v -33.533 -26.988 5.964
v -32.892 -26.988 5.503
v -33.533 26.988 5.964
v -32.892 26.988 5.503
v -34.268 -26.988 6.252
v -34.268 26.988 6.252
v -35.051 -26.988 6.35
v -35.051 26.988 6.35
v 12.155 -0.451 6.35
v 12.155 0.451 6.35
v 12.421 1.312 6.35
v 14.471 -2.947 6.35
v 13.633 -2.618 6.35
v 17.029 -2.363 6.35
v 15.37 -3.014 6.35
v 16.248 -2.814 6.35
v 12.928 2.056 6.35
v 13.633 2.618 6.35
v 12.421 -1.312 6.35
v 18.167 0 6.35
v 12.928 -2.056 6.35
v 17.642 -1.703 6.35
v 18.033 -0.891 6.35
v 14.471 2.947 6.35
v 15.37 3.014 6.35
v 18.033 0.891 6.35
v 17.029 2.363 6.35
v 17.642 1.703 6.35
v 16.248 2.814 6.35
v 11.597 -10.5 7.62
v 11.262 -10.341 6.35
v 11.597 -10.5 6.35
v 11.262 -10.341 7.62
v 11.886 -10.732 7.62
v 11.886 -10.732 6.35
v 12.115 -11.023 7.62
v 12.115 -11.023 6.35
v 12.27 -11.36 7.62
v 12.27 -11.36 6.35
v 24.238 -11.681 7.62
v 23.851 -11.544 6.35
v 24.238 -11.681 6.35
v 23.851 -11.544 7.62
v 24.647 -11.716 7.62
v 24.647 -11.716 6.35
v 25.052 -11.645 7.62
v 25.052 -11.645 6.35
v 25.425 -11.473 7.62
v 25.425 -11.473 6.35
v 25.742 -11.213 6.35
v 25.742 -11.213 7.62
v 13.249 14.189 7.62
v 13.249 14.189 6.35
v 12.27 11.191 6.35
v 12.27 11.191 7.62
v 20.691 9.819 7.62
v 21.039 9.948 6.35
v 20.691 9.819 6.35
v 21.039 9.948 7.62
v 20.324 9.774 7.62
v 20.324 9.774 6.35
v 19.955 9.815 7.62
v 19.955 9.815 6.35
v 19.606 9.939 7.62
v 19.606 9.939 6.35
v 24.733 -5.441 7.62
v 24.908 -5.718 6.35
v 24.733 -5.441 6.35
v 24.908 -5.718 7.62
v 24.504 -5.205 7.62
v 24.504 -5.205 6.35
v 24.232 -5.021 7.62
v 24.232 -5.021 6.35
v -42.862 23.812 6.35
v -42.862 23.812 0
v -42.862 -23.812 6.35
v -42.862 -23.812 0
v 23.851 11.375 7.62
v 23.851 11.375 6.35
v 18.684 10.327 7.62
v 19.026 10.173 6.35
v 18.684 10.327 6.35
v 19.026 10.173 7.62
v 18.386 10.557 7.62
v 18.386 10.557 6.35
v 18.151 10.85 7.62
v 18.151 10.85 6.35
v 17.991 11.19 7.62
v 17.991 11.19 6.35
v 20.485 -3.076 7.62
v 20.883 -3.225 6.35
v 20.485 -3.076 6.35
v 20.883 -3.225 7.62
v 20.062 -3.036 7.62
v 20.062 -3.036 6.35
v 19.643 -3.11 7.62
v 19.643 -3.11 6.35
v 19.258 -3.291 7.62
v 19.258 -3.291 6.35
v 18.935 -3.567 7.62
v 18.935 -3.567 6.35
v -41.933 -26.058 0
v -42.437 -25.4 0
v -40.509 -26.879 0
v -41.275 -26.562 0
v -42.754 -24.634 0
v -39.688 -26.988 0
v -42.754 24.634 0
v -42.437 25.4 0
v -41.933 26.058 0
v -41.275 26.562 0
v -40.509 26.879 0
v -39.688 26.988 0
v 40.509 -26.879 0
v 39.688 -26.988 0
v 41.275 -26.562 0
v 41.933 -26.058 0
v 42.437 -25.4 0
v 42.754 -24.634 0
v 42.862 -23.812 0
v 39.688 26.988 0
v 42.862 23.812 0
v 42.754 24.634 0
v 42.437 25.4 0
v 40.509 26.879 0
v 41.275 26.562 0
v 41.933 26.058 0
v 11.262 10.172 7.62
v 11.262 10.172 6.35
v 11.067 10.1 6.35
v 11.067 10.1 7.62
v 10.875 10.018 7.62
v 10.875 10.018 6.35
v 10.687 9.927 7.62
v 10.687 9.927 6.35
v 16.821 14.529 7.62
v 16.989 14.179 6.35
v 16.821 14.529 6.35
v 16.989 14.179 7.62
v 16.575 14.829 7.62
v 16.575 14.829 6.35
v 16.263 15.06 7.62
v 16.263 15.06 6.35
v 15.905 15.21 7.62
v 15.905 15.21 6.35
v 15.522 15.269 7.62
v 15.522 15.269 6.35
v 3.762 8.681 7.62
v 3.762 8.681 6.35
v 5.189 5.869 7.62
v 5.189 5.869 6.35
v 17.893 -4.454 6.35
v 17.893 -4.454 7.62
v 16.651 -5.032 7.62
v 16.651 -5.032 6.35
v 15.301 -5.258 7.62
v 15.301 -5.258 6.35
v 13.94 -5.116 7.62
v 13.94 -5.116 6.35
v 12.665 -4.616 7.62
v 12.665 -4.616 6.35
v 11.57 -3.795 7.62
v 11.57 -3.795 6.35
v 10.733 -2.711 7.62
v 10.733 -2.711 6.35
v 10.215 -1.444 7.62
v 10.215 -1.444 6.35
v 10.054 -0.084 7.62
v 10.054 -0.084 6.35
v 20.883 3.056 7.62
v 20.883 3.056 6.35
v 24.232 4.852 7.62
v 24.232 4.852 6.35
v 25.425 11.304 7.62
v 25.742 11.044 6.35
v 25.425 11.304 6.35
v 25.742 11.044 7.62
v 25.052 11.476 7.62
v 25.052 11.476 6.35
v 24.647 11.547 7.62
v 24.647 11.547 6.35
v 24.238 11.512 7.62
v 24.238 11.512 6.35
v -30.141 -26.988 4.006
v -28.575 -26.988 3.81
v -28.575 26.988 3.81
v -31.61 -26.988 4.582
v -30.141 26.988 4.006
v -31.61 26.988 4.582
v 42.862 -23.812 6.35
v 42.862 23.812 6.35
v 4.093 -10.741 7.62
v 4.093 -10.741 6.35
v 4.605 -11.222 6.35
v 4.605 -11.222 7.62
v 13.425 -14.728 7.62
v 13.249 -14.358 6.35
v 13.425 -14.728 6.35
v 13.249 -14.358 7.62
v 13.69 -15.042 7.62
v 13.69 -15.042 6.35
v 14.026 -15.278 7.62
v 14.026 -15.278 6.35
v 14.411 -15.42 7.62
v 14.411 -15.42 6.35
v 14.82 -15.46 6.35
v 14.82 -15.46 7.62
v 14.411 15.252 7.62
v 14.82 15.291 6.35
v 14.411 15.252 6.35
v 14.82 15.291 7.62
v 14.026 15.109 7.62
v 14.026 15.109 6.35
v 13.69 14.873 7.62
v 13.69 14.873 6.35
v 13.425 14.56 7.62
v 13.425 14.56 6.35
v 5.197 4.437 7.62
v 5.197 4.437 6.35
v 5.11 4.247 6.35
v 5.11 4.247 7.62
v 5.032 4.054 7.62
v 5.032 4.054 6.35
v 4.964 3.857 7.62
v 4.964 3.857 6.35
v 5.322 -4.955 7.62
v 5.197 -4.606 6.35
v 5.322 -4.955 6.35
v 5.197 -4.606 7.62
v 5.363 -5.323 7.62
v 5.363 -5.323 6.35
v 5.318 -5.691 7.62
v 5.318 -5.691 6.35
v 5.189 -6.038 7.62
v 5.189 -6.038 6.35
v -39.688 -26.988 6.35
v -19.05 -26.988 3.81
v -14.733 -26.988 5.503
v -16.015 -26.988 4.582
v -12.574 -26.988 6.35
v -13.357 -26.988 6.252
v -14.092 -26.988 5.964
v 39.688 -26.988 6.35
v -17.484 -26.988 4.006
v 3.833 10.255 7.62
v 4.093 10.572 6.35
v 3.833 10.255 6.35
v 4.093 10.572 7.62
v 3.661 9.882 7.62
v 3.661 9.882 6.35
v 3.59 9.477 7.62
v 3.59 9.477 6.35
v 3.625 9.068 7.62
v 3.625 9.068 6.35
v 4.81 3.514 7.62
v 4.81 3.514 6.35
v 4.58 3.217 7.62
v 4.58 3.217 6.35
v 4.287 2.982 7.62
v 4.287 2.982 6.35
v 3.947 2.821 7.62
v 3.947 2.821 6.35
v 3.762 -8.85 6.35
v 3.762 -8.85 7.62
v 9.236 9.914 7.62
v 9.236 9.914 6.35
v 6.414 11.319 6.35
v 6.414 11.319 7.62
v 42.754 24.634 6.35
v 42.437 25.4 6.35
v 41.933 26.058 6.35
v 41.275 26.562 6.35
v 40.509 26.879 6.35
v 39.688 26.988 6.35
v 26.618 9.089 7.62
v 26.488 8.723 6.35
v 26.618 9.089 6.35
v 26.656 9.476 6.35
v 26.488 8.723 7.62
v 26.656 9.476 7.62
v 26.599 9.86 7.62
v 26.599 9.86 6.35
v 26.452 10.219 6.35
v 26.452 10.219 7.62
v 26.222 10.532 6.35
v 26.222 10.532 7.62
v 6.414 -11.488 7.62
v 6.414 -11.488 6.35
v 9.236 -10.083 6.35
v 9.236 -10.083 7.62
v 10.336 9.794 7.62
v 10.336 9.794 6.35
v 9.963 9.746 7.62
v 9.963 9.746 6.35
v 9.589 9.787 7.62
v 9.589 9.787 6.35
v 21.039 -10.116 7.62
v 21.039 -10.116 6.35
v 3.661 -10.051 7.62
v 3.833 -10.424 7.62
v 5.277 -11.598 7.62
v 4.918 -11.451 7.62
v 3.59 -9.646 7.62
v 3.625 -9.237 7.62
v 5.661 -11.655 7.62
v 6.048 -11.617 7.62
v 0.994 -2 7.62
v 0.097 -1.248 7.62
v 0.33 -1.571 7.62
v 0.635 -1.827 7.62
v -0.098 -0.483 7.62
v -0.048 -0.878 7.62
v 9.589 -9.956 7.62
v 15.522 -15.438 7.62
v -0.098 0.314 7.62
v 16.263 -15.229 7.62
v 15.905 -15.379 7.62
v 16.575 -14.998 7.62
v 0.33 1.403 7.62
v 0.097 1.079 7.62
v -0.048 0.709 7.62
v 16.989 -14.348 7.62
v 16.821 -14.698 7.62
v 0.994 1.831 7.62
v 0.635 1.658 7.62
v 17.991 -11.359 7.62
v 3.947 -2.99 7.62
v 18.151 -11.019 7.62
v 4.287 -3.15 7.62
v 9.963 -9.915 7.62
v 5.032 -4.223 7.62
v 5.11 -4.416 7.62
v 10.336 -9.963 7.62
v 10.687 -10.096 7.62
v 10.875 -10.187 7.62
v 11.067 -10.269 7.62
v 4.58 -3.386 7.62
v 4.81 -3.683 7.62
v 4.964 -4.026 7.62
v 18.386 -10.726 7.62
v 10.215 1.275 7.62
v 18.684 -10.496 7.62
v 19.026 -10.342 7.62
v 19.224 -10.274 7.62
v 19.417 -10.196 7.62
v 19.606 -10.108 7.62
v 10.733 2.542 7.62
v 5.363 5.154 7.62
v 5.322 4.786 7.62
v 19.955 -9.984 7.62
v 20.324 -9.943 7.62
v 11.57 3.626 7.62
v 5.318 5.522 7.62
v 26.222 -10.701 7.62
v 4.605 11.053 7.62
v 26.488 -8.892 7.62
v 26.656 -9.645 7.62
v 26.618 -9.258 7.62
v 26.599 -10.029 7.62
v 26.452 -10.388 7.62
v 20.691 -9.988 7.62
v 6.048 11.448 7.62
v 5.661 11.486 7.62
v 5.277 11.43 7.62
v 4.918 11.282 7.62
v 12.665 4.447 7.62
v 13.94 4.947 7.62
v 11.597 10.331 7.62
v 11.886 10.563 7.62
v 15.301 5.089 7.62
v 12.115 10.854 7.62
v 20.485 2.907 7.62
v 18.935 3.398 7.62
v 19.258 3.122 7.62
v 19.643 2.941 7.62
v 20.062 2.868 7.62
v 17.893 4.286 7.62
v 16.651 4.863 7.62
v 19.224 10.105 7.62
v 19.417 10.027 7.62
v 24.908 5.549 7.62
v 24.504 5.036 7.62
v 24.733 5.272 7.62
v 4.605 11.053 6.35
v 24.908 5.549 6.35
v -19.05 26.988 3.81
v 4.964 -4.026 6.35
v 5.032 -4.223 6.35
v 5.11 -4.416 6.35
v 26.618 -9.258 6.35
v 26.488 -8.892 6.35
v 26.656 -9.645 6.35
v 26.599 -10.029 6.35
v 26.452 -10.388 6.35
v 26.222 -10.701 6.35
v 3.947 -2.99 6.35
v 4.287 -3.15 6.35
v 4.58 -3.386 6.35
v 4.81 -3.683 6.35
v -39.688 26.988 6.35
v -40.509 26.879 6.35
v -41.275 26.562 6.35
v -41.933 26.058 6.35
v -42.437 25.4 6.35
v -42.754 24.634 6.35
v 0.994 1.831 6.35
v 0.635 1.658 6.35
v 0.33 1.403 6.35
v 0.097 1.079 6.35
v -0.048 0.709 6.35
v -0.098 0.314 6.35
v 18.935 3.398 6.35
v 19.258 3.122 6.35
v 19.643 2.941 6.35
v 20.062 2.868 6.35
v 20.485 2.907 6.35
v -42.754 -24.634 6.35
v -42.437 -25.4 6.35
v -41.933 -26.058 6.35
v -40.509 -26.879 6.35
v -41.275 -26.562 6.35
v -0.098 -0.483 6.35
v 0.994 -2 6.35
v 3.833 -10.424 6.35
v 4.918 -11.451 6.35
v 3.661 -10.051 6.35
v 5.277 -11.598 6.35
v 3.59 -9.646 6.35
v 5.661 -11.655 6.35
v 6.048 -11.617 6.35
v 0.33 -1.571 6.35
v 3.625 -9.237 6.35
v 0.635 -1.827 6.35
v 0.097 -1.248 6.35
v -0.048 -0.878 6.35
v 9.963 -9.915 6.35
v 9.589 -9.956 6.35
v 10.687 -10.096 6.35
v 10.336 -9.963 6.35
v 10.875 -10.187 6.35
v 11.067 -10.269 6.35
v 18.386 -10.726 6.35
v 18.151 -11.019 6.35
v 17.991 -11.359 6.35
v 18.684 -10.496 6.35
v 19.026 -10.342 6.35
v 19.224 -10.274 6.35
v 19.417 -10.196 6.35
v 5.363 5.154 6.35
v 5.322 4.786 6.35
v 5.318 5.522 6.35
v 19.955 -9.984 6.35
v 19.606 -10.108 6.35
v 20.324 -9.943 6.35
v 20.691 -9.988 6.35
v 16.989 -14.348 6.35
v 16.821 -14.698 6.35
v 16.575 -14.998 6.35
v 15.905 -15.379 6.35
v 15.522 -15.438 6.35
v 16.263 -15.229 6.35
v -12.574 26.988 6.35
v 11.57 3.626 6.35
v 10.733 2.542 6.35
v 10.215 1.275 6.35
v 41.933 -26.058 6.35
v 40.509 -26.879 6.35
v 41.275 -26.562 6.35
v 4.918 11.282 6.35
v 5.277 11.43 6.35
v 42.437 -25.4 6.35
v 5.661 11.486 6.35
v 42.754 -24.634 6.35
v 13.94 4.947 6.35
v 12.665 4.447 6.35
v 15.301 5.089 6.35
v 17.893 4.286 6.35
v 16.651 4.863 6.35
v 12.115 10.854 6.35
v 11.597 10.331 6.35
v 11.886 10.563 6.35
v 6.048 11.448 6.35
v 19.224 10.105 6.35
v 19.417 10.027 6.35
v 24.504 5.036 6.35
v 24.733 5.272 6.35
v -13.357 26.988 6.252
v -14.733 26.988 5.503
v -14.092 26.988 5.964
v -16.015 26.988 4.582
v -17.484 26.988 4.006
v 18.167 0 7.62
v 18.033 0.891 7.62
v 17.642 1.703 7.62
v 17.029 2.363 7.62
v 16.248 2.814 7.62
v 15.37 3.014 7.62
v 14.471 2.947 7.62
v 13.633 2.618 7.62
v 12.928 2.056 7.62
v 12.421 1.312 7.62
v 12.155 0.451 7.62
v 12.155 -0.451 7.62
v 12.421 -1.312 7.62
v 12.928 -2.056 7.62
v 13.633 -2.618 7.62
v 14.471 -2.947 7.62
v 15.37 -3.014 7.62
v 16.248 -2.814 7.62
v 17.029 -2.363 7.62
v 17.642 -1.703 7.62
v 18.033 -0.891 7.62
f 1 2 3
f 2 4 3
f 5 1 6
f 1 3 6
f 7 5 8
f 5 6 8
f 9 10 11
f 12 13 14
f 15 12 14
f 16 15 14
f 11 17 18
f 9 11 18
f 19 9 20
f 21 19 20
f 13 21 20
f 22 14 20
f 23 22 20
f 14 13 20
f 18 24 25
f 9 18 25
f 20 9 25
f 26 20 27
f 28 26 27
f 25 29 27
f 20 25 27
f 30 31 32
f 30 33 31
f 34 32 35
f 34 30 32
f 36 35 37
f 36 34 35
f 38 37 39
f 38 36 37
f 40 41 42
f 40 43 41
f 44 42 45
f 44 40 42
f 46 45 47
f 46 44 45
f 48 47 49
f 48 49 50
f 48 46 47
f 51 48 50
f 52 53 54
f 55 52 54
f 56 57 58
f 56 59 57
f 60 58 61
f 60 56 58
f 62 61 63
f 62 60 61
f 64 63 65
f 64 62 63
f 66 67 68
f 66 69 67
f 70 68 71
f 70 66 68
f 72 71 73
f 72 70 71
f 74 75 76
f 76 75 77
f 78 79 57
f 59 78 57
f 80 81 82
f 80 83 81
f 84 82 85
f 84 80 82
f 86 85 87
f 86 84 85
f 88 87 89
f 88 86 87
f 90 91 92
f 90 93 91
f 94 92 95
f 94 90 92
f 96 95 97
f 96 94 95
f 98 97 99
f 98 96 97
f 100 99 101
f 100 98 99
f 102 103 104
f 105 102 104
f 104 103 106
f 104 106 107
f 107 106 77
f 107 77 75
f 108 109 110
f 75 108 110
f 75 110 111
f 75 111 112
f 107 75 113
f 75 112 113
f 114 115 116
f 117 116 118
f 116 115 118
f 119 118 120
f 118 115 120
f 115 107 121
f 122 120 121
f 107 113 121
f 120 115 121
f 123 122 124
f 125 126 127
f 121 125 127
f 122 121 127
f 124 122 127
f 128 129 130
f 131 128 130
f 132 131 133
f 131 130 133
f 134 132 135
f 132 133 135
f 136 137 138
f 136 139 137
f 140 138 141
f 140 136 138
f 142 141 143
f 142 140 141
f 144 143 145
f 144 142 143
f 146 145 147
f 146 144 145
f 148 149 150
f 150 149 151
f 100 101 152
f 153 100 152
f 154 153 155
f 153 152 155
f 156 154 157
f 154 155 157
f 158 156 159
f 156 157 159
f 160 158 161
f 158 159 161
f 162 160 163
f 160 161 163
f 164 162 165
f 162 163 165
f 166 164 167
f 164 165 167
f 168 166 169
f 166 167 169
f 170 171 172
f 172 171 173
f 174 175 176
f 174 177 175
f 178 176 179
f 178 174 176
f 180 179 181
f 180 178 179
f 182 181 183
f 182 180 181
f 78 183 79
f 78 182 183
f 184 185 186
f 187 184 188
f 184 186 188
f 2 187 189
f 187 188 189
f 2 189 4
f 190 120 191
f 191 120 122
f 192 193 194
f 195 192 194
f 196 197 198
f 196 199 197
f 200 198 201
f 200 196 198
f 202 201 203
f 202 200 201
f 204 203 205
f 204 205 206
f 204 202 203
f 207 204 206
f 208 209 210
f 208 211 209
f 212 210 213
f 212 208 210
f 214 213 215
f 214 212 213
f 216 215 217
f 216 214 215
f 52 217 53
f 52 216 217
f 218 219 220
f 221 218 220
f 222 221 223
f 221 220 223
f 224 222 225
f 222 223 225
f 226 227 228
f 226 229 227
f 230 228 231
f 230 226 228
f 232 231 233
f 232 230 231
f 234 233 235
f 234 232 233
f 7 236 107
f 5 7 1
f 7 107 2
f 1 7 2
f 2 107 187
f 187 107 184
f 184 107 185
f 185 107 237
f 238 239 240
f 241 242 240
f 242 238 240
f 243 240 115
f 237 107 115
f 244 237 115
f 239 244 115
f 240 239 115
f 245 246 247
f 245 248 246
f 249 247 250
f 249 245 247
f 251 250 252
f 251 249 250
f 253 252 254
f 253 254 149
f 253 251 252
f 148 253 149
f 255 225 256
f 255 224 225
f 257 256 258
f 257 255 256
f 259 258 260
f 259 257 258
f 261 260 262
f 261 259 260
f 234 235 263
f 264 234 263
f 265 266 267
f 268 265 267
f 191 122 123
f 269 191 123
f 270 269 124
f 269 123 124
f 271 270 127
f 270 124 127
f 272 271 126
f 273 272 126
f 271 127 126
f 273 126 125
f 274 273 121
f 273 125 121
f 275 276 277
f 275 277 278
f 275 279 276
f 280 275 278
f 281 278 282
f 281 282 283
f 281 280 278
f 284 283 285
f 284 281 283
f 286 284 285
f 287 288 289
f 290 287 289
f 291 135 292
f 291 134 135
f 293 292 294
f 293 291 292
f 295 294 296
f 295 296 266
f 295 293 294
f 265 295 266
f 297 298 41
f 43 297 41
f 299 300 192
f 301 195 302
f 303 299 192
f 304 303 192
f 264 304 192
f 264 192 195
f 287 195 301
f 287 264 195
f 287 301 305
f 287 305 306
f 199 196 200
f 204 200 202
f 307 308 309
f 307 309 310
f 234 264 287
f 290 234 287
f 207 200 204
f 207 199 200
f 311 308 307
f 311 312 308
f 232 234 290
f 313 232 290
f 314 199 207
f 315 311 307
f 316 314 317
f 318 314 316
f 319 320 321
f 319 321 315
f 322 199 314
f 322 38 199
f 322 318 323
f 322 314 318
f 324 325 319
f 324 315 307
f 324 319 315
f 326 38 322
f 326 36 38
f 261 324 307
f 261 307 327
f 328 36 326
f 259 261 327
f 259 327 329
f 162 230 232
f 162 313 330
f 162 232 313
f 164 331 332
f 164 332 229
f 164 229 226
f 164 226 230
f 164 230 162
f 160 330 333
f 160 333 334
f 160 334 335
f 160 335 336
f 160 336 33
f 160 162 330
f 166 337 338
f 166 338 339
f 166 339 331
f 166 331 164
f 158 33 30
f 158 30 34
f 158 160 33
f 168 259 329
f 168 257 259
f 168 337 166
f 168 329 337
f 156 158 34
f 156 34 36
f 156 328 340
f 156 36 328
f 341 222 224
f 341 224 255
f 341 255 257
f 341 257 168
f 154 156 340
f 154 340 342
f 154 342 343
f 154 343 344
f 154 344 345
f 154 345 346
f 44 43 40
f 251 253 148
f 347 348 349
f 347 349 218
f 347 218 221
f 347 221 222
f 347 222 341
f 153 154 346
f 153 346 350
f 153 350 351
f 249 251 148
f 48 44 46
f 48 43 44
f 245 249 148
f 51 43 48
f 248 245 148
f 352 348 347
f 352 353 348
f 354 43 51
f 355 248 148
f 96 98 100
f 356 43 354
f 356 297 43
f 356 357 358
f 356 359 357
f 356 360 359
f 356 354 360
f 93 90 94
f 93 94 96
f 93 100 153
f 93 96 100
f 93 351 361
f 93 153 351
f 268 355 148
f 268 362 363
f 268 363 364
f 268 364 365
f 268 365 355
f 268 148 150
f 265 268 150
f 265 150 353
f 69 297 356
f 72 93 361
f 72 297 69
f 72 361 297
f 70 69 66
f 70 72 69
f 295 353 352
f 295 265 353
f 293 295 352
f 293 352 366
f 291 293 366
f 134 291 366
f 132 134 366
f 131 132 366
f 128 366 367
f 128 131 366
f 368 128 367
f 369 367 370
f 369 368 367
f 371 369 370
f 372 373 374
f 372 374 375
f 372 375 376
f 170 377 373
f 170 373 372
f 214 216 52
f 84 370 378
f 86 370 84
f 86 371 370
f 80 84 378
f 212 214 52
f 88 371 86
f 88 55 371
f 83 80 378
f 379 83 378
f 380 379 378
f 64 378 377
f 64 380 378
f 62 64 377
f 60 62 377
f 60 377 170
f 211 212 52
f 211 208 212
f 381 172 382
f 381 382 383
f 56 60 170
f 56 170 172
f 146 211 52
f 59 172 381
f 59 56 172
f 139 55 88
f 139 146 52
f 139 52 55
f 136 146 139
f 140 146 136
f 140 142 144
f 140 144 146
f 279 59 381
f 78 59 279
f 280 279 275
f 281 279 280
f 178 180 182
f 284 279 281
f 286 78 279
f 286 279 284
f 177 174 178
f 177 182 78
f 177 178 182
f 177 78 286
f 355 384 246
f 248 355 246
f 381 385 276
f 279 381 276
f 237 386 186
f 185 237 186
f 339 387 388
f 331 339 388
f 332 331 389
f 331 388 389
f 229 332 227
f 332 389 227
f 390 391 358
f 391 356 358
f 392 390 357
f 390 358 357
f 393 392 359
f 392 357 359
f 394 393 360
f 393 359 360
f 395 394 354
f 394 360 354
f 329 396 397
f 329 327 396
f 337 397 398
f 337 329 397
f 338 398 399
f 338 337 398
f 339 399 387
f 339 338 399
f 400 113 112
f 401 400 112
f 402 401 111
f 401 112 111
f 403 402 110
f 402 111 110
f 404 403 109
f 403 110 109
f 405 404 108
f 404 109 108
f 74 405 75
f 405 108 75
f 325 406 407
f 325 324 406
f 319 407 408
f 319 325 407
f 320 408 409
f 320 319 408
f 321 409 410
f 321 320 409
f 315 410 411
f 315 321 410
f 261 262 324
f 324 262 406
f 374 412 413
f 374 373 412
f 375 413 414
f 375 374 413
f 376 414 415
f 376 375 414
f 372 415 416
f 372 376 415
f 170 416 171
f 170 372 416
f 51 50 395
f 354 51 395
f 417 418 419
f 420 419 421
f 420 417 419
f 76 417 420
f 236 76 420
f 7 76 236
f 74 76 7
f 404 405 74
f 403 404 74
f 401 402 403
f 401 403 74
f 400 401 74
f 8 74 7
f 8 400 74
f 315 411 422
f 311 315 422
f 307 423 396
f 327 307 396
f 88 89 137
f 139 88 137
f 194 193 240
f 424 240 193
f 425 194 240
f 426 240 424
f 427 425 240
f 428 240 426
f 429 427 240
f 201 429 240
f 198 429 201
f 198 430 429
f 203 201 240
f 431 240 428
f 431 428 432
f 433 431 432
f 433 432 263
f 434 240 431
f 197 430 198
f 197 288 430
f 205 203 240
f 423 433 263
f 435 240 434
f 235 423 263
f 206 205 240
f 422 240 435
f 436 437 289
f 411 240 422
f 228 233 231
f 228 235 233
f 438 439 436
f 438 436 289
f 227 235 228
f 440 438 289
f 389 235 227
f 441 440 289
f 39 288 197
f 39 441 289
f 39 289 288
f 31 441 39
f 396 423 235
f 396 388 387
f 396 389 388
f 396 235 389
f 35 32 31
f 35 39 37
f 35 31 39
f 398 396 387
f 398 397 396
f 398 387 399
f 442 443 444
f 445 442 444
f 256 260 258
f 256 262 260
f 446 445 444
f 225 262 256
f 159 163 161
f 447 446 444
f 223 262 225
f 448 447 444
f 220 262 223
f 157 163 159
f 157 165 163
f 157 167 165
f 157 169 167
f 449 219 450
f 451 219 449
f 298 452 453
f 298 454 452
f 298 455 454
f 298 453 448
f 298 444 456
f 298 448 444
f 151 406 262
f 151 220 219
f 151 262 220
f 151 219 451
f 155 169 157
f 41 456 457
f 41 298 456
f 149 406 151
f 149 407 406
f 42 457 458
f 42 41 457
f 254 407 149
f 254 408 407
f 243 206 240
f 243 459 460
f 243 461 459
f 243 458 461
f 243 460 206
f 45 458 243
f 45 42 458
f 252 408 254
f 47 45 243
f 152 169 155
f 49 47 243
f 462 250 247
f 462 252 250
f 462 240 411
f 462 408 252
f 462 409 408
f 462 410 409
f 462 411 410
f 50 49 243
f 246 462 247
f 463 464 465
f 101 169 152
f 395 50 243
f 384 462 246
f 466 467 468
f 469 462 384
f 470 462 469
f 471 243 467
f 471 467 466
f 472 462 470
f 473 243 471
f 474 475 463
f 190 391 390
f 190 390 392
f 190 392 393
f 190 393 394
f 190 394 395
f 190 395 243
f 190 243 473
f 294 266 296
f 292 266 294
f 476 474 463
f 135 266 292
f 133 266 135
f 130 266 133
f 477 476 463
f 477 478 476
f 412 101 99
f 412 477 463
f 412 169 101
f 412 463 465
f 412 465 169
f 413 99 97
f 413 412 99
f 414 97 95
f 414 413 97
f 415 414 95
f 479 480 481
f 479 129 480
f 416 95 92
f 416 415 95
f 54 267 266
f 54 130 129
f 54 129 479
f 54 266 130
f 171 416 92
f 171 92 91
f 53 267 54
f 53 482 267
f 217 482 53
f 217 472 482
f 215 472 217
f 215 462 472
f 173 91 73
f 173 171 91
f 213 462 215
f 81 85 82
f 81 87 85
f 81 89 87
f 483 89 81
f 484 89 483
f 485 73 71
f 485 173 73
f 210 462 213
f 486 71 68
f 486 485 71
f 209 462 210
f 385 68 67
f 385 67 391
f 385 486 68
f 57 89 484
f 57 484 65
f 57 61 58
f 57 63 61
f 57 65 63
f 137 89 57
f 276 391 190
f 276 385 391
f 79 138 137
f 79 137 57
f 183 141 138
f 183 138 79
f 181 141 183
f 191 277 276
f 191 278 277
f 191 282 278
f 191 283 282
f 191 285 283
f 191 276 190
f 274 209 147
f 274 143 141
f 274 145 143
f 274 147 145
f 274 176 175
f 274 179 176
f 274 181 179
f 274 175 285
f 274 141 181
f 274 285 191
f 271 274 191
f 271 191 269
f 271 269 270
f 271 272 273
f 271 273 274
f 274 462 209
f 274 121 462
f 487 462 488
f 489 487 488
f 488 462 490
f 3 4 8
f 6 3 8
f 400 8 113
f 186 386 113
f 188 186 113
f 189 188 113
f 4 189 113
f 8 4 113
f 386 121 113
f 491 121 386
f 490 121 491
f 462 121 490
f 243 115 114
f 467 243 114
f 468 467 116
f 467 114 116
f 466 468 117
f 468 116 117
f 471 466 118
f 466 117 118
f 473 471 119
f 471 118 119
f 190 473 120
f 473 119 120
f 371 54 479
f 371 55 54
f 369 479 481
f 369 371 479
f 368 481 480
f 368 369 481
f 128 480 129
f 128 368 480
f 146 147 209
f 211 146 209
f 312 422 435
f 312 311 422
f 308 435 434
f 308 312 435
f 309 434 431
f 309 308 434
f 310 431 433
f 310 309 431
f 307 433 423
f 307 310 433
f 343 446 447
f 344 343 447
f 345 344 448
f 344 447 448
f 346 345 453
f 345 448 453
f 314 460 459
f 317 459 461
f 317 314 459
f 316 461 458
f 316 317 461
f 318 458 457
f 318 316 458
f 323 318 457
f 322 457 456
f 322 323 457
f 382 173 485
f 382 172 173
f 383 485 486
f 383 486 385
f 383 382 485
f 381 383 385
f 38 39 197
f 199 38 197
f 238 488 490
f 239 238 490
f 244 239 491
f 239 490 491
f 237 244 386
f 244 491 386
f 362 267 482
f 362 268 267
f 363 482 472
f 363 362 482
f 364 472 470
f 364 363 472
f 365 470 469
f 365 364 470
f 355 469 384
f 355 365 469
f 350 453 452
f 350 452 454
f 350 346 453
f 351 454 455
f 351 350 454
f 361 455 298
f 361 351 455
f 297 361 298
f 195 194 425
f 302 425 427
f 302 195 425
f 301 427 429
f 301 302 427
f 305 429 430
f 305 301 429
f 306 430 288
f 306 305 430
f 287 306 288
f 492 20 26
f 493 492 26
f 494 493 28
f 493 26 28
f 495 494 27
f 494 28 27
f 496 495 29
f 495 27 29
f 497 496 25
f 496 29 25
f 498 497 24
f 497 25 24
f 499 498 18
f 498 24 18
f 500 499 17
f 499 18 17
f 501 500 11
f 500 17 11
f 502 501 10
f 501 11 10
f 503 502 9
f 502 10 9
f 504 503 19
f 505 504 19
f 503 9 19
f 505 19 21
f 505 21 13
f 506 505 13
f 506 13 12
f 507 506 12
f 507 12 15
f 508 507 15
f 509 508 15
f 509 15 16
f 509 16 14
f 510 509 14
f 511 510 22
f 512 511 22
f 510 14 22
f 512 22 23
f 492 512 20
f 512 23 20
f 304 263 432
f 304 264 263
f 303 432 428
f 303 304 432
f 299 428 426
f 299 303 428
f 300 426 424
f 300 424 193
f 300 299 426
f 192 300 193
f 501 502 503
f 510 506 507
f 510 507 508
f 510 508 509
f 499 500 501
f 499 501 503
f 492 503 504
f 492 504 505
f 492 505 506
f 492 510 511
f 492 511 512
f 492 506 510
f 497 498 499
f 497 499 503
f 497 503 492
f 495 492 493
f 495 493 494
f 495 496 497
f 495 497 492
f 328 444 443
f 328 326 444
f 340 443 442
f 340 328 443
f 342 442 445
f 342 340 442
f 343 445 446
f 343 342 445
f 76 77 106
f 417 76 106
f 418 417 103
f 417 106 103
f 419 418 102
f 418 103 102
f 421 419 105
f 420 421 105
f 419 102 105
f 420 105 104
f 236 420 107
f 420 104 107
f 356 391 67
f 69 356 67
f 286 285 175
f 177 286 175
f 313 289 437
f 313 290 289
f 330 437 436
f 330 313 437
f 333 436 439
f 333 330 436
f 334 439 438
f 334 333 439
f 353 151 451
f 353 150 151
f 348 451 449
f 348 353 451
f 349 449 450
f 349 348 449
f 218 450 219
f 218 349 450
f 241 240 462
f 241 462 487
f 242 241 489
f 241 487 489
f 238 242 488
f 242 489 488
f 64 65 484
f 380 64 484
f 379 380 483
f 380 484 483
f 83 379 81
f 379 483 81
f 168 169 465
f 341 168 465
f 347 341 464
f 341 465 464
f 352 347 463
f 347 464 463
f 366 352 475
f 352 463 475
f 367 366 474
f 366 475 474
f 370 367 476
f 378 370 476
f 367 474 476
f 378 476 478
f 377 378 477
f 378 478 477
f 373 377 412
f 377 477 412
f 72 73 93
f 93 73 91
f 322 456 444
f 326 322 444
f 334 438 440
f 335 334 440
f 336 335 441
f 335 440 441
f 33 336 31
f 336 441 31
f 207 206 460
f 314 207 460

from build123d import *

# Parameters (mm, degrees)
F1_DEPTH = 6.35
F3_DEPTH = 76.2
F4_R     = 3.175
F6_DEPTH = 1.27
F5_R     = 3.022839237
F7_R     = 1.6002


with BuildPart() as f1:
    # F0 (on Top) → F1 (new body)
    with BuildSketch(Plane.XY):
        with BuildLine():
            Line((-39.6875, -26.9875), (39.6875, -26.9875))
            ThreePointArc((39.6875, -26.9875), (41.9325640303, -26.0575640303), (42.8625, -23.8125))
            Line((42.8625, -23.8125), (42.8625, 23.8125))
            ThreePointArc((42.8625, 23.8125), (41.9325640303, 26.0575640303), (39.6875, 26.9875))
            Line((39.6875, 26.9875), (-39.6875, 26.9875))
            ThreePointArc((-39.6875, 26.9875), (-41.9325640303, 26.0575640303), (-42.8625, 23.8125))
            Line((-42.8625, 23.8125), (-42.8625, -23.8125))
            ThreePointArc((-42.8625, -23.8125), (-41.9325640303, -26.0575640303), (-39.6875, -26.9875))
        make_face()
    extrude(amount=F1_DEPTH)

    # F2 (on face) → F3 (cut)
    with BuildSketch(Plane(origin=(0, 26.9875, 0), x_dir=(-1, 0, 0), z_dir=(0, 1, 0))):
        with BuildLine():
            ThreePointArc((19.05, 16.51), (12.7, 10.16), (19.05, 3.81))
            Line((19.05, 3.81), (28.575, 3.81))
            ThreePointArc((28.575, 3.81), (34.925, 10.16), (28.575, 16.51))
            Line((28.575, 16.51), (19.05, 16.51))
        make_face()
    extrude(amount=-F3_DEPTH, mode=Mode.SUBTRACT)

    # F4
    f4_edges = [f1.edges().sort_by_distance(p)[0] for p in [
        (-13.97, 0, 6.35),
        (-33.655, 0, 6.35),
    ]]
    fillet(f4_edges, radius=F4_R)

    # F5 (on face) → F6 (join)
    with BuildSketch(Plane.XY.offset(6.35)):
        with BuildLine():
            Line((26.9846954019, -9.8890943361), (24.6813038786, -5.2619308793))
            Line((24.6813038786, -5.2619308793), (19.6397530794, -2.5584178956))
            ThreePointArc((19.6397530794, -2.5584178956), (13.8718936075, -5.0986079783), (10.0536296353, -0.0844651021))
            ThreePointArc((10.0536296353, -0.0844651021), (13.8718936075, 4.929677774), (19.6397530794, 2.3894876914))
            Line((19.6397530794, 2.3894876914), (24.6813038786, 5.0930006751))
            Line((24.6813038786, 5.0930006751), (26.9846954019, 9.7201641319))
            Line((26.9846954019, 9.7201641319), (24.9206350104, 11.9179907053))
            Line((24.9206350104, 11.9179907053), (20.2478260164, 9.5458885687))
            ThreePointArc((20.2478260164, 9.5458885687), (19.3146437966, 10.0695514207), (18.2777250704, 10.3338455627))
            Line((18.2777250704, 10.3338455627), (16.6345701783, 15.2344879866))
            Line((16.6345701783, 15.2344879866), (13.6209610048, 15.3290749609))
            Line((13.6209610048, 15.3290749609), (11.9941155844, 10.3475705276))
            ThreePointArc((11.9941155844, 10.3475705276), (10.9639705549, 10.0579966056), (10.0438741121, 9.5116685229))
            Line((10.0438741121, 9.5116685229), (5.4167106552, 11.8150600462))
            Line((5.4167106552, 11.8150600462), (3.2188840818, 9.7509996548))
            Line((3.2188840818, 9.7509996548), (5.5909862184, 5.0781906607))
            ThreePointArc((5.5909862184, 5.0781906607), (5.0673233663, 4.1450084408), (4.8030292243, 3.1080897147))
            Line((4.8030292243, 3.1080897147), (-0.0976131995, 1.4649348226))
            Line((-0.0976131995, 1.4649348226), (-0.0976131995, -1.6338650268))
            Line((-0.0976131995, -1.6338650268), (4.8030292244, -3.2770199189))
            ThreePointArc((4.8030292244, -3.2770199189), (5.0673233664, -4.313938645), (5.5909862184, -5.2471208649))
            Line((5.5909862184, -5.2471208649), (3.2188840818, -9.919929859))
            Line((3.2188840818, -9.919929859), (5.4167106552, -11.9839902504))
            Line((5.4167106552, -11.9839902504), (10.0438741121, -9.6805987271))
            ThreePointArc((10.0438741121, -9.6805987271), (10.9639705549, -10.2269268099), (11.9941155844, -10.5165007319))
            Line((11.9941155844, -10.5165007319), (13.6209610048, -15.4980051652))
            Line((13.6209610048, -15.4980051652), (16.6345701783, -15.4034181908))
            Line((16.6345701783, -15.4034181908), (18.2777250704, -10.502775767))
            ThreePointArc((18.2777250704, -10.502775767), (19.3146437966, -10.238481625), (20.2478260164, -9.714818773))
            Line((20.2478260164, -9.714818773), (24.9206350104, -12.0869209095))
            Line((24.9206350104, -12.0869209095), (26.9846954019, -9.8890943361))
        make_face()
    extrude(amount=F6_DEPTH)

    # F7
    f7_edges = [f1.edges().sort_by_distance(p)[0] for p in [
        (3.218884, -9.91993, 6.985),
        (5.416711, -11.98399, 6.985),
        (10.043874, -9.680599, 6.985),
        (11.994116, -10.516501, 6.985),
        (13.620961, -15.498005, 6.985),
        (16.63457, -15.403418, 6.985),
        (24.920635, -12.086921, 6.985),
        (20.247826, -9.714819, 6.985),
        (18.277725, -10.502776, 6.985),
        (26.984695, -9.889094, 6.985),
        (24.681304, -5.261931, 6.985),
        (19.639753, -2.558418, 6.985),
        (19.639753, 2.389488, 6.985),
        (24.681304, 5.093001, 6.985),
        (26.984695, 9.720164, 6.985),
        (24.920635, 11.917991, 6.985),
        (20.247826, 9.545889, 6.985),
        (18.277725, 10.333846, 6.985),
        (16.63457, 15.234488, 6.985),
        (13.620961, 15.329075, 6.985),
        (11.994116, 10.347571, 6.985),
        (10.043874, 9.511669, 6.985),
        (5.416711, 11.81506, 6.985),
        (3.218884, 9.751, 6.985),
        (4.803029, 3.10809, 6.985),
        (5.590986, 5.078191, 6.985),
        (5.590986, -5.247121, 6.985),
        (4.803029, -3.27702, 6.985),
        (-0.097613, -1.633865, 6.985),
        (-0.097613, 1.464935, 6.985),
    ]]
    fillet(f7_edges, radius=F7_R)


with BuildPart() as f6:
    # F5 (on face) → F6, piece 2 (new body)
    with BuildSketch(Plane.XY.offset(6.35)):
        with Locations((15.1441273911, 0)):
            Circle(F5_R)
    extrude(amount=F6_DEPTH)


solid = Compound([f1.part, f6.part])
